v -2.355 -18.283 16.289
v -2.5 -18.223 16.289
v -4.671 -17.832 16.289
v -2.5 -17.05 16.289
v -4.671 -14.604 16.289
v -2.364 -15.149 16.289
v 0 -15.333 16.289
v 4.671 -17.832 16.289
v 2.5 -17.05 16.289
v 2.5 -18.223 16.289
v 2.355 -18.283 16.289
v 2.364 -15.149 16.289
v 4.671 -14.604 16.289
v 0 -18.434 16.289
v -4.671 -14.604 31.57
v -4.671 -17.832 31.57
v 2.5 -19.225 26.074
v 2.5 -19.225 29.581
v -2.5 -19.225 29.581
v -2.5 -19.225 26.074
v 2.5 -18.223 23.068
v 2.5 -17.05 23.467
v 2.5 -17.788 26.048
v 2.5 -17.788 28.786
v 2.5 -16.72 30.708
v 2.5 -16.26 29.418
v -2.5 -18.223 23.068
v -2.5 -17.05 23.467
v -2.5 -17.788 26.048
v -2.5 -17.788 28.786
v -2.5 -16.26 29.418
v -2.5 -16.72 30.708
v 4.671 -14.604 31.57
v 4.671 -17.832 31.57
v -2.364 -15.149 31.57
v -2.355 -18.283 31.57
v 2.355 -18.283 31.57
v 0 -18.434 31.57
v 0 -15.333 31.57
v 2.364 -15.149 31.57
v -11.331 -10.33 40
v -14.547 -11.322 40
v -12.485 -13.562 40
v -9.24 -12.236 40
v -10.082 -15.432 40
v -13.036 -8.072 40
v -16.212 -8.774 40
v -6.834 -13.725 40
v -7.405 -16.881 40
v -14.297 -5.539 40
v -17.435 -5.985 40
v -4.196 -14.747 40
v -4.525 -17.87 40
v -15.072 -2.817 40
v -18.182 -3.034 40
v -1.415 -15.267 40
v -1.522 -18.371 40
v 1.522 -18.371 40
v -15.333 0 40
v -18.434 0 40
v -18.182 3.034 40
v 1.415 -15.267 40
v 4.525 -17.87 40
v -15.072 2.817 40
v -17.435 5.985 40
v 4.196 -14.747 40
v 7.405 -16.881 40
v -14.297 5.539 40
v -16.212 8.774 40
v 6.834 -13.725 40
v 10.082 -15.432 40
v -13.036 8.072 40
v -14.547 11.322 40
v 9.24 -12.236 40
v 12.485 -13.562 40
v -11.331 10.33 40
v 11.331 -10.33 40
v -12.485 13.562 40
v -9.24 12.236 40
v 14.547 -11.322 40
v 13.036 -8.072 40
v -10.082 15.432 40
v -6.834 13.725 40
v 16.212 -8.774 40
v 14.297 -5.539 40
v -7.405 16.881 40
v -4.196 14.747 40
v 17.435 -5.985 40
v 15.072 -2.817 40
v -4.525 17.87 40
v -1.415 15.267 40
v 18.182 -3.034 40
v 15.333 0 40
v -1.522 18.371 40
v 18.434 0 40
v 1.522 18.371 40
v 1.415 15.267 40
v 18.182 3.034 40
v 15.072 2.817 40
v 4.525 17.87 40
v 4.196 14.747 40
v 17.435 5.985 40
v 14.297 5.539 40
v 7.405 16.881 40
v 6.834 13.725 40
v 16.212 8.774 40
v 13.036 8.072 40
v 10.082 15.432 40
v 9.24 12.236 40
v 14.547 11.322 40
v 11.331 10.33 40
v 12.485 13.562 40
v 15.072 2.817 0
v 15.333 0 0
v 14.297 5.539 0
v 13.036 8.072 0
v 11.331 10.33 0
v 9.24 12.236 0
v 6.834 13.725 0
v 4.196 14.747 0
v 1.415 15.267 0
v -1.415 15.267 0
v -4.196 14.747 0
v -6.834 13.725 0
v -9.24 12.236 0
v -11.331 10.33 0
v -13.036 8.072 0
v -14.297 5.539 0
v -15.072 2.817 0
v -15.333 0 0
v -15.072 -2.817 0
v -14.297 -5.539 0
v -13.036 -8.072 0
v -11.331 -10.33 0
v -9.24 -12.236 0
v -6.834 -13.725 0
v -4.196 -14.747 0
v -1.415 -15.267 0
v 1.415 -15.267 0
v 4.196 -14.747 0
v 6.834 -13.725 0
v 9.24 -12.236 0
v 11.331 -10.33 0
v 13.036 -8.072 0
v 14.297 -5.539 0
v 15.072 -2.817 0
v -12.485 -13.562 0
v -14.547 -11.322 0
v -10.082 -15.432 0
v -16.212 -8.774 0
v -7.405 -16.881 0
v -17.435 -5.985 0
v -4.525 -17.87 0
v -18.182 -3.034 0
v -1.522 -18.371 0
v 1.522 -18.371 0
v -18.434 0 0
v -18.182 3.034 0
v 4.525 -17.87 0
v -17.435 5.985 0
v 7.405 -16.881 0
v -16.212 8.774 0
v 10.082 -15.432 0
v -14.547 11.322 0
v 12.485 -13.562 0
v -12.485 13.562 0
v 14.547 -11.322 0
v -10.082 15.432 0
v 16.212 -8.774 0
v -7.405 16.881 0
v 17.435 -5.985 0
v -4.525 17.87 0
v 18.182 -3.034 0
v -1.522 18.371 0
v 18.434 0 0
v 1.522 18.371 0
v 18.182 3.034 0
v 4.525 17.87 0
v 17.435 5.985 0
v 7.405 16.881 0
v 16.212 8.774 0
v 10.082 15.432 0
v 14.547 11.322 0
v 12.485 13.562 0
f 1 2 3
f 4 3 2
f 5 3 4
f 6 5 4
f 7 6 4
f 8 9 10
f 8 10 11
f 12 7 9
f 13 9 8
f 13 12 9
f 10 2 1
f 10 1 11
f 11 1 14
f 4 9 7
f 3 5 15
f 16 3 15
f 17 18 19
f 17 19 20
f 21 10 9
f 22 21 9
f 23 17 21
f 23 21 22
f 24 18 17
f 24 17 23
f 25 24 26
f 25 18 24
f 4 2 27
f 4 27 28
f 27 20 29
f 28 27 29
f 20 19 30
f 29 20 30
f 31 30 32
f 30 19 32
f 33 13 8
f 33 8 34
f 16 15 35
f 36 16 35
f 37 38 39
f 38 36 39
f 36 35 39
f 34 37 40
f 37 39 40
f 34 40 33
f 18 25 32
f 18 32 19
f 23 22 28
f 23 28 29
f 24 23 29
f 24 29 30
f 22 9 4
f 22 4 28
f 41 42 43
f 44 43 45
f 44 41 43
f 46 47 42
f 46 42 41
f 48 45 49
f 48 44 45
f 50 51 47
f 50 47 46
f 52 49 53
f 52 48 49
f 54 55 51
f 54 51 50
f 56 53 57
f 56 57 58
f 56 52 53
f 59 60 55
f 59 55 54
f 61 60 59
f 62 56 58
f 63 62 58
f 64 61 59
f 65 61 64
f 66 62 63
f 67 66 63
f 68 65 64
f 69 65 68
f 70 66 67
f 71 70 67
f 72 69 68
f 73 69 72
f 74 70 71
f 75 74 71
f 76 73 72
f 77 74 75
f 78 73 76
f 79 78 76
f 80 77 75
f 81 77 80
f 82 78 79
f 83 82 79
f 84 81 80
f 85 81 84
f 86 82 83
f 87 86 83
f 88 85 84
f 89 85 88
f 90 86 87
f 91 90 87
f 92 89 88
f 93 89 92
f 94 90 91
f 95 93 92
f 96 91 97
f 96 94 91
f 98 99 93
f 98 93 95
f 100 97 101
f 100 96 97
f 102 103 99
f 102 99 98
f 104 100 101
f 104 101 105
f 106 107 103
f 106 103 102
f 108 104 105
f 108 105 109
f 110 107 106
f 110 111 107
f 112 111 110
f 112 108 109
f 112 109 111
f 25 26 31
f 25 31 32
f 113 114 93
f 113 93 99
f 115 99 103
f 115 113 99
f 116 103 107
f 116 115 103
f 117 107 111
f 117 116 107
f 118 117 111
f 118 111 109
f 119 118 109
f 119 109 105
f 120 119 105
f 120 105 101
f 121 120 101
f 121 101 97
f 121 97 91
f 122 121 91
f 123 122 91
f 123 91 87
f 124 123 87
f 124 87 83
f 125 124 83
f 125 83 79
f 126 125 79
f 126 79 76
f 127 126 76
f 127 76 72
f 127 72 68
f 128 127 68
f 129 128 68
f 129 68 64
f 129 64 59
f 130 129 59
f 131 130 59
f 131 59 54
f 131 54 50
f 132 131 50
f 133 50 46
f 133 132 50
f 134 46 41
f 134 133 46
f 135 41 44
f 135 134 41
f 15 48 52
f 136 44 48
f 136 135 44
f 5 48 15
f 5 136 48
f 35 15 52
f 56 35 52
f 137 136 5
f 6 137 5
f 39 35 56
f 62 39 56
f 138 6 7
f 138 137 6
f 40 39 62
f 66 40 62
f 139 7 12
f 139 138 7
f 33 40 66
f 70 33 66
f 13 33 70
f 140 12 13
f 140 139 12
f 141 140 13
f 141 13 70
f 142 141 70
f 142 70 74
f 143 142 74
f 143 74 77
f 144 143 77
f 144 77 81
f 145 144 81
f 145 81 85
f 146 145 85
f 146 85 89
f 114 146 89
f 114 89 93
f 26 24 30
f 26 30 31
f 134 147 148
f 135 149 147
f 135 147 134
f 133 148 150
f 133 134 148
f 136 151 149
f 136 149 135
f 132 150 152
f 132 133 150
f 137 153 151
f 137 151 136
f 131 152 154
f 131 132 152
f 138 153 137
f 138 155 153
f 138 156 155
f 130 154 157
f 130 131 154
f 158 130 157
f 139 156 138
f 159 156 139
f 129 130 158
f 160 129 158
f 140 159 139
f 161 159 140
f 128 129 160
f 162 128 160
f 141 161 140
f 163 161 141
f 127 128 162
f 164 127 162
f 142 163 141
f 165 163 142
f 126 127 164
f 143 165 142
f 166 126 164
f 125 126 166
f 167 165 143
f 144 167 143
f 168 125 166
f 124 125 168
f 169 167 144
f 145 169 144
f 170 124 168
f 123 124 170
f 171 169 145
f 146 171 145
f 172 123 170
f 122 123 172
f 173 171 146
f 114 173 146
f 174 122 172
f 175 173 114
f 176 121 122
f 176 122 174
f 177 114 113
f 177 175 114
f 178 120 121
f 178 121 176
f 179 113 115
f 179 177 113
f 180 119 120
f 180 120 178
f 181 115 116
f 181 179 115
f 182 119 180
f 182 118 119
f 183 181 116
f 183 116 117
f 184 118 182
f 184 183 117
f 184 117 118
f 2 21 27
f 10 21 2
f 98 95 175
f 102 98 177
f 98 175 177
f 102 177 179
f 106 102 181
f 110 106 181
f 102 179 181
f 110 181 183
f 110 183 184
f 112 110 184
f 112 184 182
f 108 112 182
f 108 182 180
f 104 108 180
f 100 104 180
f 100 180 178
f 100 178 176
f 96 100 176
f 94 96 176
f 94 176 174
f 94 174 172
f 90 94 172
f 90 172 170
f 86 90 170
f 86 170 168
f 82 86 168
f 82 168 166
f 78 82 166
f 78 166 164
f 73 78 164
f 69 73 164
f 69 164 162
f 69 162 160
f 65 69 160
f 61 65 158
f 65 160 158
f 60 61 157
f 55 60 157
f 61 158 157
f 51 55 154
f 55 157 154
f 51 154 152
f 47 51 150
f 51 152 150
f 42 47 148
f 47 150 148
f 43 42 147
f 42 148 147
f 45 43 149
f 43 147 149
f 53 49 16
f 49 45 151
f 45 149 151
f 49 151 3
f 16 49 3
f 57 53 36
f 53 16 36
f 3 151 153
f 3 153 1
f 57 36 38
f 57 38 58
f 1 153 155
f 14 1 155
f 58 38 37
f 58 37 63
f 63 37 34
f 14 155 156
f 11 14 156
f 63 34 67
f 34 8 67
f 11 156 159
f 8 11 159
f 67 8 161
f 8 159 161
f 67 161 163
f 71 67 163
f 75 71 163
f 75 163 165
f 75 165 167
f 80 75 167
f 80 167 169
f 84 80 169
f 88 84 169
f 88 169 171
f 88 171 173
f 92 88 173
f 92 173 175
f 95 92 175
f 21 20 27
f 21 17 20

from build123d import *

# Parameters (mm, degrees)
F0_R     = 18.433835
F0_R_2   = 15.332756
F1_DEPTH = 40
F2_W     = 9.342166
F2_H     = 15.280273
F3_DEPTH = 25
F6_DEPTH = 2.5


with BuildPart() as f1:
    # F0 (on Top) → F1 (new body)
    with BuildSketch(Plane.XY):
        Circle(F0_R)
        Circle(F0_R_2, mode=Mode.SUBTRACT)
    extrude(amount=F1_DEPTH)


with BuildPart() as f3:
    # F2 (on Front) → F3 (new body)
    with BuildSketch(Plane.XZ):
        with Locations((0, 23.92951)):
            Rectangle(F2_W, F2_H)
    extrude(amount=F3_DEPTH)


with BuildPart() as f1_1:
    add(f1.part)

    # F4: cut F3
    add(f3.part, mode=Mode.SUBTRACT)

    # F5 (on Right) → F6 (join, symmetric)
    with BuildSketch(Plane.YZ):
        Polygon((-18.222677, 16.054166), (-18.222677, 0), (-17.050333, 0), (-17.050333, 23.467397), (-17.787579, 26.047755), (-17.787579, 28.786093), (-16.260428, 29.418018), (-16.719699, 30.708198), (-19.224662, 29.580966), (-19.224662, 26.074016), (-18.222677, 23.068061), align=None)
    extrude(amount=F6_DEPTH, both=True)


solid = f1_1.part
